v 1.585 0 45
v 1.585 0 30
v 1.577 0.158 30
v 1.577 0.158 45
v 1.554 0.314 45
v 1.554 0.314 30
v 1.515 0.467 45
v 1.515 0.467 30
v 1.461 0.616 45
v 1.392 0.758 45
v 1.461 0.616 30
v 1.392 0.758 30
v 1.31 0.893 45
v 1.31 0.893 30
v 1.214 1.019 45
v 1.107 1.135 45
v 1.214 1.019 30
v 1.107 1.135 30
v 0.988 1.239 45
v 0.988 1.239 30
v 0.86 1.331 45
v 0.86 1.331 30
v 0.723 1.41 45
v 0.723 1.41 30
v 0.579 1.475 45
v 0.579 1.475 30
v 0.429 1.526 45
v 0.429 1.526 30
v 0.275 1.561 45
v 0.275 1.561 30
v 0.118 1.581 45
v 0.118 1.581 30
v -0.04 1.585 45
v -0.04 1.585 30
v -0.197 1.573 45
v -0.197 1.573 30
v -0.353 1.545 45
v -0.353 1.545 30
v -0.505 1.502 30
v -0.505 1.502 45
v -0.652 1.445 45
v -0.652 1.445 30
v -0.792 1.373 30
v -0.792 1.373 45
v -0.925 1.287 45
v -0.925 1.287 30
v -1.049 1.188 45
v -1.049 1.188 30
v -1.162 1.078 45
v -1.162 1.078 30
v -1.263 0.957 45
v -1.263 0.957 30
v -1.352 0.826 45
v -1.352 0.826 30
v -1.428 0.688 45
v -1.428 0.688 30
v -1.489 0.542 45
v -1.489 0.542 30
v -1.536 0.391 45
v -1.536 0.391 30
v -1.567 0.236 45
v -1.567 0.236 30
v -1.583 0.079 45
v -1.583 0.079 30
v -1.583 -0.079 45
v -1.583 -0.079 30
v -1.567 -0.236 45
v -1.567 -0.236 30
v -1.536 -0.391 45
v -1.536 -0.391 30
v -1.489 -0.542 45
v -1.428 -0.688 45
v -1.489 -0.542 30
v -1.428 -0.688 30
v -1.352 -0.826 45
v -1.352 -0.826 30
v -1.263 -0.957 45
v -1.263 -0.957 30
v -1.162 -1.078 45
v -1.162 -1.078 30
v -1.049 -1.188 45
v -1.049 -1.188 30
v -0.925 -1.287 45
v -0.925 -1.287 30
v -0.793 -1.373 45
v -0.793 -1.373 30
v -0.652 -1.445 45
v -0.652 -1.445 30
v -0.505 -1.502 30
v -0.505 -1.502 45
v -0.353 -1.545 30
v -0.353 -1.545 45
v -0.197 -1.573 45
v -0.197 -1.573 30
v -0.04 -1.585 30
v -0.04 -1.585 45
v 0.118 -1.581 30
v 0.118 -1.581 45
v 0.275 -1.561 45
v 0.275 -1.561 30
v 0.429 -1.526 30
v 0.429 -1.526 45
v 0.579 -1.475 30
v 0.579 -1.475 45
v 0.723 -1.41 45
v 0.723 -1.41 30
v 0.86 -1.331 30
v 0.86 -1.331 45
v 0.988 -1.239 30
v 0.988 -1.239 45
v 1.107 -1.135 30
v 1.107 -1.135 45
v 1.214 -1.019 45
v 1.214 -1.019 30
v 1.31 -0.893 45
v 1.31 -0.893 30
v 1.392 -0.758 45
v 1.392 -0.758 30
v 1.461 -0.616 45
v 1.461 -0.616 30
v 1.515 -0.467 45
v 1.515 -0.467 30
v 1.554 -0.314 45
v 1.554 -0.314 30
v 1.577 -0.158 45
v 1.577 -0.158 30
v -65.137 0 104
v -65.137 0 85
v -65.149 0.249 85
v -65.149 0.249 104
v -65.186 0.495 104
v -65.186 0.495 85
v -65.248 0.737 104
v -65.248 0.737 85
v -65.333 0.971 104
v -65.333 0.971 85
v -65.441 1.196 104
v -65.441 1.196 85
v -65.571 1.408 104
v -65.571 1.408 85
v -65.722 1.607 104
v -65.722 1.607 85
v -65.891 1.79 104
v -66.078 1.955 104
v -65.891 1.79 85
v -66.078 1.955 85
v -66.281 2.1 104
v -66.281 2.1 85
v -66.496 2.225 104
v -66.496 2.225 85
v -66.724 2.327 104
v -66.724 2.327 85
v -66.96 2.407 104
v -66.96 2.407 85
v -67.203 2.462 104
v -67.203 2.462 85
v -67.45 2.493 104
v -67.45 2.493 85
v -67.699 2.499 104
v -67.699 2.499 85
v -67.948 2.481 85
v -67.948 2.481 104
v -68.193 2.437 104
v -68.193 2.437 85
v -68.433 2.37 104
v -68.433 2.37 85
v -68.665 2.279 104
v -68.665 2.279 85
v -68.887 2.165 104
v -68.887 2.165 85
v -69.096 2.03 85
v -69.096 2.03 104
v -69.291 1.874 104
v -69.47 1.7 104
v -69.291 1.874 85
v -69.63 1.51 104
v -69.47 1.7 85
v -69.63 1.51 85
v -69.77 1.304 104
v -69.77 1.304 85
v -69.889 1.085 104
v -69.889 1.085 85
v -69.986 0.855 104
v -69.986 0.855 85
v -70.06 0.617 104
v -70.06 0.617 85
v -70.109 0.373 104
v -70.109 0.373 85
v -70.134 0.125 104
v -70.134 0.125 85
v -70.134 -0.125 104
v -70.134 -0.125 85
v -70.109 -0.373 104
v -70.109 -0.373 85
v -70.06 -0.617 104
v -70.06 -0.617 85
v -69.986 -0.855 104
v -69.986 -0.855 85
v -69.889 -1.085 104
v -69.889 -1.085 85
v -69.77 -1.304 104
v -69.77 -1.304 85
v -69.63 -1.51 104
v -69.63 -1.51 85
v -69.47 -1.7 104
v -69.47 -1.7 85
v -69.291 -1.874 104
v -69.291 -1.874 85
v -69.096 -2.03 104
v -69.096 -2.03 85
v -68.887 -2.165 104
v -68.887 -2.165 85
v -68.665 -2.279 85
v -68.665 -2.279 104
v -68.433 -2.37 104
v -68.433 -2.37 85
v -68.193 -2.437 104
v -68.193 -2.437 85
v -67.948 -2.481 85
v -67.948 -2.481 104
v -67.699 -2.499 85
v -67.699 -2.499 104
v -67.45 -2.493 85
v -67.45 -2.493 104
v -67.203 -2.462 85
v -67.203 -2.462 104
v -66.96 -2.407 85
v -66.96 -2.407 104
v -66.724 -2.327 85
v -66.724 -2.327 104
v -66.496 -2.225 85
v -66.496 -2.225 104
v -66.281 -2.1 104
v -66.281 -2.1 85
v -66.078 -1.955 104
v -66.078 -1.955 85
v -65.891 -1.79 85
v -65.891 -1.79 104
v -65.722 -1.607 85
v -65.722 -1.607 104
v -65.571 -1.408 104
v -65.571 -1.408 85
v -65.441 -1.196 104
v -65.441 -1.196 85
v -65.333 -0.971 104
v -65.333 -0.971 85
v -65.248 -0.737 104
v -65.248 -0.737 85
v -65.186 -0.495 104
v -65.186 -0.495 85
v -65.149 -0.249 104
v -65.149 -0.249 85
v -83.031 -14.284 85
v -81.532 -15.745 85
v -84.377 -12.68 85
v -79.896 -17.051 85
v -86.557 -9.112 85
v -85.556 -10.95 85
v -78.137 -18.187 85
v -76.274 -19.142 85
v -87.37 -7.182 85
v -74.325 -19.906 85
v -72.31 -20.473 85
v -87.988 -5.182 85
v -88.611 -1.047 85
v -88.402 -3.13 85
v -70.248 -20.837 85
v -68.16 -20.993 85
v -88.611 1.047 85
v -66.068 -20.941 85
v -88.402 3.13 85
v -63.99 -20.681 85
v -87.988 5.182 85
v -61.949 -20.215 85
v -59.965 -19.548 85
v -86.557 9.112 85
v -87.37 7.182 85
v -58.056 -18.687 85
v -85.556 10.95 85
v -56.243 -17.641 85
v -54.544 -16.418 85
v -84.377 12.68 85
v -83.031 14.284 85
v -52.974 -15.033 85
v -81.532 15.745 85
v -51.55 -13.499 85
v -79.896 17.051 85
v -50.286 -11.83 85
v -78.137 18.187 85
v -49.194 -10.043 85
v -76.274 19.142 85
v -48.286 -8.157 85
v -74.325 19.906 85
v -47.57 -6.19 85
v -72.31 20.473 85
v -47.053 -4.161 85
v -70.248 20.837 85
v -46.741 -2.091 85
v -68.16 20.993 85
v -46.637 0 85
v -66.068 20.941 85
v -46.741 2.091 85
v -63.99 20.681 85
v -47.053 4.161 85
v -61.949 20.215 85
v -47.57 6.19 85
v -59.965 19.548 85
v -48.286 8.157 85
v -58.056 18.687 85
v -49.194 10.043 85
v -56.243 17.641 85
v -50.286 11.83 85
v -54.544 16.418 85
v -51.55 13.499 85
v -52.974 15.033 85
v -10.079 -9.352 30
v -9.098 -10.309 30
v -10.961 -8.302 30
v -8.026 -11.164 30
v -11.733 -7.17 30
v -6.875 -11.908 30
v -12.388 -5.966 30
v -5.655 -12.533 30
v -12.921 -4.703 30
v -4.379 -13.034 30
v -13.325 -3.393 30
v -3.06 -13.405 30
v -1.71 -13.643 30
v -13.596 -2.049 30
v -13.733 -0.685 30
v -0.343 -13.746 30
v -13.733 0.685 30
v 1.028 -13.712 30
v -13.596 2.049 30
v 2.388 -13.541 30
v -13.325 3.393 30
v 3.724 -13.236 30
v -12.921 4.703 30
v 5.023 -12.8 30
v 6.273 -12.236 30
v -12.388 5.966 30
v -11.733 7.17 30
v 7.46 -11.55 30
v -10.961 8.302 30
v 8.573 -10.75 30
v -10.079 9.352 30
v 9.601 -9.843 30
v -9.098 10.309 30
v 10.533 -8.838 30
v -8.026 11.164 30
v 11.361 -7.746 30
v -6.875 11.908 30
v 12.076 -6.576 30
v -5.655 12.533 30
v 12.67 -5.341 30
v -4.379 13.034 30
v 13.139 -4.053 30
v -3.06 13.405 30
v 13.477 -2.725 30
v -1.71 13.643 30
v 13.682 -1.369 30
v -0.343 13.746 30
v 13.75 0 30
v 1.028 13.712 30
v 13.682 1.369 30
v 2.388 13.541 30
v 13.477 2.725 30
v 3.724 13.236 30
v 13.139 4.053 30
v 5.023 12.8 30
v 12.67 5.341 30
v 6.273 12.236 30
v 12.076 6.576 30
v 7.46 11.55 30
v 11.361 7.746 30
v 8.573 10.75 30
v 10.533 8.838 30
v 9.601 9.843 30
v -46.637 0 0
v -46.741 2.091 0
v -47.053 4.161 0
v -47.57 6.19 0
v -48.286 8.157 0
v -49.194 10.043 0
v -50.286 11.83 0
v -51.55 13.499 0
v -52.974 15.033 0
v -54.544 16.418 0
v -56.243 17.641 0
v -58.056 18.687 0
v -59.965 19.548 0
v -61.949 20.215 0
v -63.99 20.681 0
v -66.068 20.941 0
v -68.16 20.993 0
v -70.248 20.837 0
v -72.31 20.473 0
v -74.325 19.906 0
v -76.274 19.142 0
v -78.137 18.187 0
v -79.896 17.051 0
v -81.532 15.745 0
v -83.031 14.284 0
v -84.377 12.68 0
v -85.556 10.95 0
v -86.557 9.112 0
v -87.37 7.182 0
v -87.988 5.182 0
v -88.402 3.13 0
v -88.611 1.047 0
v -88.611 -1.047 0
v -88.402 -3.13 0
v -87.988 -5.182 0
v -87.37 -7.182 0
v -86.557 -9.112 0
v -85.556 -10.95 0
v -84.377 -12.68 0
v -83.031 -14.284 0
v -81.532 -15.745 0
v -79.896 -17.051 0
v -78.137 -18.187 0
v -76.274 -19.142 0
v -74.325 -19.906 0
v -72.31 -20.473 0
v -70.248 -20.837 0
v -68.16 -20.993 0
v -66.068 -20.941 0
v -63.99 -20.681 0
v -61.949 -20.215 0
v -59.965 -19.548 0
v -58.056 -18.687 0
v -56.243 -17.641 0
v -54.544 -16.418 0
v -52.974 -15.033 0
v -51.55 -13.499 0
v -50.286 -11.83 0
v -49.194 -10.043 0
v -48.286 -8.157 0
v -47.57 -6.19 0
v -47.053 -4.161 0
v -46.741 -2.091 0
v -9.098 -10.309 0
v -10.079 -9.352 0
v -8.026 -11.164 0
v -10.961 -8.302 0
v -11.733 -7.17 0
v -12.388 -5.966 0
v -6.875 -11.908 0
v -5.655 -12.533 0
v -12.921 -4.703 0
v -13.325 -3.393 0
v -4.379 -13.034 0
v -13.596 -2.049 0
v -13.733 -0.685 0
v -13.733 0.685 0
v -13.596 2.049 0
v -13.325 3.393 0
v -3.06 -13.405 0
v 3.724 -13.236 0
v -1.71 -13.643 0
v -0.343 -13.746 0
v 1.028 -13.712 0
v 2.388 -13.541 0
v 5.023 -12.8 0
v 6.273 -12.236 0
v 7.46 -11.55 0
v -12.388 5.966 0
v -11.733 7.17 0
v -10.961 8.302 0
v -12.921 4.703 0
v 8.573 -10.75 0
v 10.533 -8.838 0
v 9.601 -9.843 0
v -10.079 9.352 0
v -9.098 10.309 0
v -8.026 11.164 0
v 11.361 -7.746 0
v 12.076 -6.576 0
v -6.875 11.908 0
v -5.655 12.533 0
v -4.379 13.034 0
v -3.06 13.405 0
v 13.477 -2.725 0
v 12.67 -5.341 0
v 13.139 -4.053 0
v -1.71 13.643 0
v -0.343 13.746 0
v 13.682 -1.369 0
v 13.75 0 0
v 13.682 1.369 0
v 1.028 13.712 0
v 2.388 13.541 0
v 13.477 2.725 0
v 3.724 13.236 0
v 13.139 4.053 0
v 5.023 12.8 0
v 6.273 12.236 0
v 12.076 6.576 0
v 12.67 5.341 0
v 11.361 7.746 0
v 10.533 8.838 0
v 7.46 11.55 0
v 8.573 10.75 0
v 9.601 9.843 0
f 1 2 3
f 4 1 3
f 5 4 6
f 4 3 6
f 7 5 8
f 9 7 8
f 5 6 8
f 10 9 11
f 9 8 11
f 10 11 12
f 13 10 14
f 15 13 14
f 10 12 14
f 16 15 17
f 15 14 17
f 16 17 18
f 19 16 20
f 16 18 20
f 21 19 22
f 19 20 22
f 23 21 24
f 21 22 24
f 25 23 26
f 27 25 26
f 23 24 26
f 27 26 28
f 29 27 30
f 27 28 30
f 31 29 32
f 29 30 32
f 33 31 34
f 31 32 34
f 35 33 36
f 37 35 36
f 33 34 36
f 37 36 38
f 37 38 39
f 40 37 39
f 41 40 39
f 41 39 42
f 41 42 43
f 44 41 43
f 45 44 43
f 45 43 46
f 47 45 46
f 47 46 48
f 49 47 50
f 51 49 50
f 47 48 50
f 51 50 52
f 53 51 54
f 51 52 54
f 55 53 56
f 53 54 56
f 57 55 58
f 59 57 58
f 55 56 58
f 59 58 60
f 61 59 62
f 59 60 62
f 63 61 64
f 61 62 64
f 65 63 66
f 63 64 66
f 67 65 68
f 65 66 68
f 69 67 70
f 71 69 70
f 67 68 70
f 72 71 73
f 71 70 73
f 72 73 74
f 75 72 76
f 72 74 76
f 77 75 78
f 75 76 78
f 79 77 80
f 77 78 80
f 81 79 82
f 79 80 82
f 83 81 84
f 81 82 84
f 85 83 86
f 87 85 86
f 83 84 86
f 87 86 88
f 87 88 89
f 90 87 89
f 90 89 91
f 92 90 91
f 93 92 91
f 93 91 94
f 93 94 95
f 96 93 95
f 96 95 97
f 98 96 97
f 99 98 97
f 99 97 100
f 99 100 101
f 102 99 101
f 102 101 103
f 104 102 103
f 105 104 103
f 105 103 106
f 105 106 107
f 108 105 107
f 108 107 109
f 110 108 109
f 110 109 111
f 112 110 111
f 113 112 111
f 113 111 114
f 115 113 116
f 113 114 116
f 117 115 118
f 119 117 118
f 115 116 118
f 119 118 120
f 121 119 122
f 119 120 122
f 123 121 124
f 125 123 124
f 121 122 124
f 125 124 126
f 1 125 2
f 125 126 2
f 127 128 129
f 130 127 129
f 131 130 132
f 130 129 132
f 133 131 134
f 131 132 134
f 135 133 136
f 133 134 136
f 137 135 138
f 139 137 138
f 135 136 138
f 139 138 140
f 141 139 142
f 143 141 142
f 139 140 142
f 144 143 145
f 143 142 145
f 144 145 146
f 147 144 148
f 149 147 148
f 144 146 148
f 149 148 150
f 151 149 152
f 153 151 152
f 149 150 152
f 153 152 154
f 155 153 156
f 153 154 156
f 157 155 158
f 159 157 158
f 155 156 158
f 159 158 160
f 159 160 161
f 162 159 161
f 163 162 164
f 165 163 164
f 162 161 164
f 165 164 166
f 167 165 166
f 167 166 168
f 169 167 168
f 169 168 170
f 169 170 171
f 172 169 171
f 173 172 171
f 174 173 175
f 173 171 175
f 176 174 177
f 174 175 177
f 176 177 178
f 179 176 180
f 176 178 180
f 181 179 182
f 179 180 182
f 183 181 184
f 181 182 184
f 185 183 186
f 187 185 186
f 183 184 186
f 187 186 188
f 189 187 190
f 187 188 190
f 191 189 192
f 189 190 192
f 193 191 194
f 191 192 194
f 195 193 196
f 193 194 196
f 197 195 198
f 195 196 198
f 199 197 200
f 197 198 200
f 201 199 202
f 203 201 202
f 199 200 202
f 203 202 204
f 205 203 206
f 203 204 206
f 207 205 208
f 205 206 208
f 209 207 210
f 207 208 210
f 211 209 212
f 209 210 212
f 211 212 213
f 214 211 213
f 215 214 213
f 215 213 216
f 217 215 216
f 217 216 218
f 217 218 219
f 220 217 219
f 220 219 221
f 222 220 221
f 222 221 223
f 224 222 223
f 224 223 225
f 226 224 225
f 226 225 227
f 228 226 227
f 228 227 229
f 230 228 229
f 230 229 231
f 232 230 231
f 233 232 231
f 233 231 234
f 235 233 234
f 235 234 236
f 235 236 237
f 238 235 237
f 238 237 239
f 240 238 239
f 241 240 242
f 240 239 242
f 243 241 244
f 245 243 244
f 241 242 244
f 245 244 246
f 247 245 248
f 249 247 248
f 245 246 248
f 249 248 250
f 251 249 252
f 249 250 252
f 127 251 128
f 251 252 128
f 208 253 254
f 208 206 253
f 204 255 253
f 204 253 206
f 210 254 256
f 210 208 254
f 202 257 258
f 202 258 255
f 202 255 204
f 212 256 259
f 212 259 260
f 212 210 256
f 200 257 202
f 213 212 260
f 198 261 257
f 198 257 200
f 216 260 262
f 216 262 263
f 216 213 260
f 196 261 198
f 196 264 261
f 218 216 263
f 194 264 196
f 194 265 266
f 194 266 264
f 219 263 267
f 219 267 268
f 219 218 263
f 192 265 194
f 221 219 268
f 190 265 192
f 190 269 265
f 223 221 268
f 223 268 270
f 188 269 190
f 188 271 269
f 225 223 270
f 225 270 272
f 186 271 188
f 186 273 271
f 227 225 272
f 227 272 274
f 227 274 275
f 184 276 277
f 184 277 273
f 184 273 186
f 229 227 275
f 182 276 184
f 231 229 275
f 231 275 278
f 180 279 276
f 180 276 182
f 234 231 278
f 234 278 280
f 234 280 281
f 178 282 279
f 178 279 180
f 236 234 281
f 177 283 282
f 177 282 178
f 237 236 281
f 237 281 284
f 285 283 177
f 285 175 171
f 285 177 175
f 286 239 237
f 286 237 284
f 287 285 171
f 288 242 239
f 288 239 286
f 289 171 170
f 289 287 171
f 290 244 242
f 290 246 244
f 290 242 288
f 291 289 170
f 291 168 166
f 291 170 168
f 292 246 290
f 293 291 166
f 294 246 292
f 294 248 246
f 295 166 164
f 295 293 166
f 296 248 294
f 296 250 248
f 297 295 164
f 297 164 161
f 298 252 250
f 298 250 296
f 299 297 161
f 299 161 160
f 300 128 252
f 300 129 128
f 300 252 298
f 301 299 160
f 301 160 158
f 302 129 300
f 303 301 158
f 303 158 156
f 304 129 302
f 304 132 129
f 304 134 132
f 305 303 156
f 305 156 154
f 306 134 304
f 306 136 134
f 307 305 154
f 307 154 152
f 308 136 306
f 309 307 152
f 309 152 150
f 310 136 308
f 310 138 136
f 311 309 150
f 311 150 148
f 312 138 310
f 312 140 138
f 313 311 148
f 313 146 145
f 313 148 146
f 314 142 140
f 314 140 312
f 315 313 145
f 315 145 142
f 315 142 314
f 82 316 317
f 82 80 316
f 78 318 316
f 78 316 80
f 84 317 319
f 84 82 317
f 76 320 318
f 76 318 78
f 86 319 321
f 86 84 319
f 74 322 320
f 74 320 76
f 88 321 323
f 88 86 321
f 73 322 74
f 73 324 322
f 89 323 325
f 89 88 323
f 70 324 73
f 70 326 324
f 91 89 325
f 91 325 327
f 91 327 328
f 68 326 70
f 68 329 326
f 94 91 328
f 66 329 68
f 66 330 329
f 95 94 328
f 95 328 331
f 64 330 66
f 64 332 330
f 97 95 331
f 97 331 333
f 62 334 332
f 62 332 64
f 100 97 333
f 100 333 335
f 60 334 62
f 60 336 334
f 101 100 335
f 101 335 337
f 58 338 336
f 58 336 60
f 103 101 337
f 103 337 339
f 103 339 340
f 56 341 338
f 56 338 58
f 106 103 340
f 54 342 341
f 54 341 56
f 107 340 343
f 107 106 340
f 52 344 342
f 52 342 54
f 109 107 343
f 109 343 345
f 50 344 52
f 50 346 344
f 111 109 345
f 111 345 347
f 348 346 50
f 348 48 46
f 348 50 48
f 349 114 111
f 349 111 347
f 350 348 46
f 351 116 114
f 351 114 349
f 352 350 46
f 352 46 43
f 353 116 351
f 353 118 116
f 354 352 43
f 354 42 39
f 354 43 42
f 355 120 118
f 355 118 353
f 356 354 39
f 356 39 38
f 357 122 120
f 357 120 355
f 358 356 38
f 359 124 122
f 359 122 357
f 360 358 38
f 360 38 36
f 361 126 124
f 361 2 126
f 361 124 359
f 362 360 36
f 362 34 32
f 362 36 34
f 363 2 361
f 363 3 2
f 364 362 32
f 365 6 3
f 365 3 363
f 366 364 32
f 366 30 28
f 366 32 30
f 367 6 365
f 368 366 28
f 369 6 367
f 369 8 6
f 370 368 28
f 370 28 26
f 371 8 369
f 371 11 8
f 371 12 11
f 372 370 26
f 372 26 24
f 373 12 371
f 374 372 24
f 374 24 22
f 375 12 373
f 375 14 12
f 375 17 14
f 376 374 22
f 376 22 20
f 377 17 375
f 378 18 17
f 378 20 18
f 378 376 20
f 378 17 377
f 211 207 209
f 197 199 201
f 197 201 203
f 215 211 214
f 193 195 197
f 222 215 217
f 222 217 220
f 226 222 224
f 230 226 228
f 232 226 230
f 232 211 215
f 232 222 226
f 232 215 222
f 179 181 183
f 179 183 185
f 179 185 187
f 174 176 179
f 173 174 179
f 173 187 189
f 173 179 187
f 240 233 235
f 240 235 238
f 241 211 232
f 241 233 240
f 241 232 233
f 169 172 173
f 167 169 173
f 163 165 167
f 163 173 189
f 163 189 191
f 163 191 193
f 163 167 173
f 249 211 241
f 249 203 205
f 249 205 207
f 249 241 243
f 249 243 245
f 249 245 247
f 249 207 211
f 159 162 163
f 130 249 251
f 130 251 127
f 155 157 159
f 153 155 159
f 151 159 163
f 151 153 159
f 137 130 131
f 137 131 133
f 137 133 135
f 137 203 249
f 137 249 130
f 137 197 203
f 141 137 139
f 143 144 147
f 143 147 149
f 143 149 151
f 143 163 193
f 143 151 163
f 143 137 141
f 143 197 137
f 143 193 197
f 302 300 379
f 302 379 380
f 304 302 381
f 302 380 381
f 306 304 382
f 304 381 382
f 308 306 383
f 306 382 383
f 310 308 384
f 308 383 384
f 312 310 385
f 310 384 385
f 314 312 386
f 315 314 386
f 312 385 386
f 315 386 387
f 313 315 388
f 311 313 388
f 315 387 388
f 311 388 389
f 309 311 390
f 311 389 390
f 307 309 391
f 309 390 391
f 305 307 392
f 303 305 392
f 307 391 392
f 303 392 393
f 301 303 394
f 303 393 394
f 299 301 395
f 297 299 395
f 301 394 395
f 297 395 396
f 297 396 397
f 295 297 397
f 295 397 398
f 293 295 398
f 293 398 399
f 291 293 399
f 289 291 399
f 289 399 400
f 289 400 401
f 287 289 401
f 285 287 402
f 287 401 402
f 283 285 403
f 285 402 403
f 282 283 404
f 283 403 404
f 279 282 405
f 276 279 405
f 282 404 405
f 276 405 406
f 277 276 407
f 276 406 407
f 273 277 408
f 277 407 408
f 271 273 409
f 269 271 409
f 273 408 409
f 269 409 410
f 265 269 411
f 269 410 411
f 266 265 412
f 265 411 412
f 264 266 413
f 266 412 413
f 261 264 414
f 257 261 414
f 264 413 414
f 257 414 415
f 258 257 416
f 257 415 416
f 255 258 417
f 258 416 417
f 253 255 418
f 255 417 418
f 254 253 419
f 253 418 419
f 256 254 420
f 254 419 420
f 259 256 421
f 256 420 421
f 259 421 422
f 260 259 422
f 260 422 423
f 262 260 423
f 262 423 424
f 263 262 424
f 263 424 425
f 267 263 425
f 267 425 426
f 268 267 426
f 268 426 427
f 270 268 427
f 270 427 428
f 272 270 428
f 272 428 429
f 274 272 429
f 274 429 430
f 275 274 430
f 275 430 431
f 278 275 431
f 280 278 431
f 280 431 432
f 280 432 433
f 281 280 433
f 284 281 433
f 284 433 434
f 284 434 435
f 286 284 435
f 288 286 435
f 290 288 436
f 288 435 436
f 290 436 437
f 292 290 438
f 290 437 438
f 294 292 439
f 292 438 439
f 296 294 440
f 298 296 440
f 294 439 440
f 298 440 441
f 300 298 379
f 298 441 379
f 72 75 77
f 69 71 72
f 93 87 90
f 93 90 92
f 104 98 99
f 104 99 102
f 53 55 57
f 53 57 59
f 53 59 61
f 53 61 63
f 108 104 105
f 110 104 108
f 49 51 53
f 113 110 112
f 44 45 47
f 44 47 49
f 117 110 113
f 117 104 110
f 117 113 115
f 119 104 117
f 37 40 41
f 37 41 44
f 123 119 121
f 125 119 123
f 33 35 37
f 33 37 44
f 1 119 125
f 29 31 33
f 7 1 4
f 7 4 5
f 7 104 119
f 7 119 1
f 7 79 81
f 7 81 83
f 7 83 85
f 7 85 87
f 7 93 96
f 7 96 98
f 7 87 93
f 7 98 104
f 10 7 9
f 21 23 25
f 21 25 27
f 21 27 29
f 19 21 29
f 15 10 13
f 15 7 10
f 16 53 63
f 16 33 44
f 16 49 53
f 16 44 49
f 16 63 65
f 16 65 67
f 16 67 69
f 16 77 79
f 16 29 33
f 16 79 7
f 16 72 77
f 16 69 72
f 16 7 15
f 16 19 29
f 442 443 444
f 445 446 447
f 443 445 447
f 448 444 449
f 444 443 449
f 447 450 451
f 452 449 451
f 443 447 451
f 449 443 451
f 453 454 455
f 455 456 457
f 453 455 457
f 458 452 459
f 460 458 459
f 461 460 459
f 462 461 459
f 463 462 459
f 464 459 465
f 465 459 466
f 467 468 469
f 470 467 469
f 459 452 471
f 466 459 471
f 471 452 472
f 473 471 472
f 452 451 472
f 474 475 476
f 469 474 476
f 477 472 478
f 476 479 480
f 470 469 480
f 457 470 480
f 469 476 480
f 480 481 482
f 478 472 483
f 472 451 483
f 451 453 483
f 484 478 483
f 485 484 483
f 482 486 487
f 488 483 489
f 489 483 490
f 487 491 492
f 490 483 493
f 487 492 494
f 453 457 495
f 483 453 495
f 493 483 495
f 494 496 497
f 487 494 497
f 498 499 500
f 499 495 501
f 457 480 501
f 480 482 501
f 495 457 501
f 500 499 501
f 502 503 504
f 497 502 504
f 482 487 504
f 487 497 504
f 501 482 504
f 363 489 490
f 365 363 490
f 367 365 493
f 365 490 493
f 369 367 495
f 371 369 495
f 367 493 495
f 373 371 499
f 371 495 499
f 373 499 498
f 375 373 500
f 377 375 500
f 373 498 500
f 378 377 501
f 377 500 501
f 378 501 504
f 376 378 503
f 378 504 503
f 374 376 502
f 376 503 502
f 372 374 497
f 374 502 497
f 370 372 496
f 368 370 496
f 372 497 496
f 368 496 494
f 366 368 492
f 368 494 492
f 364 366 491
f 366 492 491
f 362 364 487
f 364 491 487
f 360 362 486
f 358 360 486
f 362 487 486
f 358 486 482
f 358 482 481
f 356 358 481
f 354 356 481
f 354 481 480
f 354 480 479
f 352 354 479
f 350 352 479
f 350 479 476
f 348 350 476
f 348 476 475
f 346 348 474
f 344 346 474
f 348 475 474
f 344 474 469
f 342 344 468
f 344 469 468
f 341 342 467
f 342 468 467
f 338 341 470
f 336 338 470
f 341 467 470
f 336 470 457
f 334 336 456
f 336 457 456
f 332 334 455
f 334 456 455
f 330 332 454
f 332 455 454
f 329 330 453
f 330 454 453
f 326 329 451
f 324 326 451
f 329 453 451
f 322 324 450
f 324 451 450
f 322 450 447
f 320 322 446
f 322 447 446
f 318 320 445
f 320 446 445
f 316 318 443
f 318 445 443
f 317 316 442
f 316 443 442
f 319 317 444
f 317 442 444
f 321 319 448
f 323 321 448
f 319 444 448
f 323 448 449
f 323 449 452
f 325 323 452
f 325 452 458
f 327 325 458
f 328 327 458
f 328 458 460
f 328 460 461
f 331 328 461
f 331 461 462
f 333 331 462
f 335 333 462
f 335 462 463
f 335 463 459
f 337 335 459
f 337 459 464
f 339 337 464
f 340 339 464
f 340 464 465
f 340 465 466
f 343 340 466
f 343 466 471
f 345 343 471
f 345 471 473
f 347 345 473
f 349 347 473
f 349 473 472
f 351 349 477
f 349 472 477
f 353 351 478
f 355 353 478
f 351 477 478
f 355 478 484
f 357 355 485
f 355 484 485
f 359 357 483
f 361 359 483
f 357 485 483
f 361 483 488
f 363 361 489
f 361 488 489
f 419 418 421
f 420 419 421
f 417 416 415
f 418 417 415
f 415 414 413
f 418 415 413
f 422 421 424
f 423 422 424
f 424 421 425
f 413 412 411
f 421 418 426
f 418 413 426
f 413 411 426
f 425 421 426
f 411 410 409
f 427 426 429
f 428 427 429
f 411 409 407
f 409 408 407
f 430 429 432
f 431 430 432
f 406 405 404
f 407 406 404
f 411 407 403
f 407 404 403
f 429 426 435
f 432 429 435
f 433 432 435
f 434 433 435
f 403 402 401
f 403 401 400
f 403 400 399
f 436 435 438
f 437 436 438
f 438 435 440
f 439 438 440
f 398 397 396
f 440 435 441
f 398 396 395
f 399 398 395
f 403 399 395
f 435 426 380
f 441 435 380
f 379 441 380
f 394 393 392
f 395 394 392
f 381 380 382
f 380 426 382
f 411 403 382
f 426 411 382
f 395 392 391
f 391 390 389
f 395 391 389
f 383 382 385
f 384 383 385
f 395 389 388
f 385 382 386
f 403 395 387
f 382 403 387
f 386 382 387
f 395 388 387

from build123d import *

# Parameters (mm, degrees)
F0_R     = 13.75
F1_DEPTH = 30
F2_R     = 1.585
F3_DEPTH = 15
F4_R     = 21
F5_DEPTH = 85
F6_R     = 2.5
F7_DEPTH = 19


with BuildPart() as f1:
    # F0 (on Top) → F1 (new body)
    with BuildSketch(Plane.XY):
        Circle(F0_R)
    extrude(amount=F1_DEPTH)

    # F2 (on face) → F3 (join)
    with BuildSketch(Plane.XY.offset(30)):
        Circle(F2_R)
    extrude(amount=F3_DEPTH)


with BuildPart() as f5:
    # F4 (on Top) → F5 (new body)
    with BuildSketch(Plane.XY):
        with Locations((-67.636903, 0)):
            Circle(F4_R)
    extrude(amount=F5_DEPTH)

    # F6 (on face) → F7 (join)
    with BuildSketch(Plane.XY.offset(85)):
        with Locations((-67.636903, 0)):
            Circle(F6_R)
    extrude(amount=F7_DEPTH)


solid = Compound([f1.part, f5.part])
